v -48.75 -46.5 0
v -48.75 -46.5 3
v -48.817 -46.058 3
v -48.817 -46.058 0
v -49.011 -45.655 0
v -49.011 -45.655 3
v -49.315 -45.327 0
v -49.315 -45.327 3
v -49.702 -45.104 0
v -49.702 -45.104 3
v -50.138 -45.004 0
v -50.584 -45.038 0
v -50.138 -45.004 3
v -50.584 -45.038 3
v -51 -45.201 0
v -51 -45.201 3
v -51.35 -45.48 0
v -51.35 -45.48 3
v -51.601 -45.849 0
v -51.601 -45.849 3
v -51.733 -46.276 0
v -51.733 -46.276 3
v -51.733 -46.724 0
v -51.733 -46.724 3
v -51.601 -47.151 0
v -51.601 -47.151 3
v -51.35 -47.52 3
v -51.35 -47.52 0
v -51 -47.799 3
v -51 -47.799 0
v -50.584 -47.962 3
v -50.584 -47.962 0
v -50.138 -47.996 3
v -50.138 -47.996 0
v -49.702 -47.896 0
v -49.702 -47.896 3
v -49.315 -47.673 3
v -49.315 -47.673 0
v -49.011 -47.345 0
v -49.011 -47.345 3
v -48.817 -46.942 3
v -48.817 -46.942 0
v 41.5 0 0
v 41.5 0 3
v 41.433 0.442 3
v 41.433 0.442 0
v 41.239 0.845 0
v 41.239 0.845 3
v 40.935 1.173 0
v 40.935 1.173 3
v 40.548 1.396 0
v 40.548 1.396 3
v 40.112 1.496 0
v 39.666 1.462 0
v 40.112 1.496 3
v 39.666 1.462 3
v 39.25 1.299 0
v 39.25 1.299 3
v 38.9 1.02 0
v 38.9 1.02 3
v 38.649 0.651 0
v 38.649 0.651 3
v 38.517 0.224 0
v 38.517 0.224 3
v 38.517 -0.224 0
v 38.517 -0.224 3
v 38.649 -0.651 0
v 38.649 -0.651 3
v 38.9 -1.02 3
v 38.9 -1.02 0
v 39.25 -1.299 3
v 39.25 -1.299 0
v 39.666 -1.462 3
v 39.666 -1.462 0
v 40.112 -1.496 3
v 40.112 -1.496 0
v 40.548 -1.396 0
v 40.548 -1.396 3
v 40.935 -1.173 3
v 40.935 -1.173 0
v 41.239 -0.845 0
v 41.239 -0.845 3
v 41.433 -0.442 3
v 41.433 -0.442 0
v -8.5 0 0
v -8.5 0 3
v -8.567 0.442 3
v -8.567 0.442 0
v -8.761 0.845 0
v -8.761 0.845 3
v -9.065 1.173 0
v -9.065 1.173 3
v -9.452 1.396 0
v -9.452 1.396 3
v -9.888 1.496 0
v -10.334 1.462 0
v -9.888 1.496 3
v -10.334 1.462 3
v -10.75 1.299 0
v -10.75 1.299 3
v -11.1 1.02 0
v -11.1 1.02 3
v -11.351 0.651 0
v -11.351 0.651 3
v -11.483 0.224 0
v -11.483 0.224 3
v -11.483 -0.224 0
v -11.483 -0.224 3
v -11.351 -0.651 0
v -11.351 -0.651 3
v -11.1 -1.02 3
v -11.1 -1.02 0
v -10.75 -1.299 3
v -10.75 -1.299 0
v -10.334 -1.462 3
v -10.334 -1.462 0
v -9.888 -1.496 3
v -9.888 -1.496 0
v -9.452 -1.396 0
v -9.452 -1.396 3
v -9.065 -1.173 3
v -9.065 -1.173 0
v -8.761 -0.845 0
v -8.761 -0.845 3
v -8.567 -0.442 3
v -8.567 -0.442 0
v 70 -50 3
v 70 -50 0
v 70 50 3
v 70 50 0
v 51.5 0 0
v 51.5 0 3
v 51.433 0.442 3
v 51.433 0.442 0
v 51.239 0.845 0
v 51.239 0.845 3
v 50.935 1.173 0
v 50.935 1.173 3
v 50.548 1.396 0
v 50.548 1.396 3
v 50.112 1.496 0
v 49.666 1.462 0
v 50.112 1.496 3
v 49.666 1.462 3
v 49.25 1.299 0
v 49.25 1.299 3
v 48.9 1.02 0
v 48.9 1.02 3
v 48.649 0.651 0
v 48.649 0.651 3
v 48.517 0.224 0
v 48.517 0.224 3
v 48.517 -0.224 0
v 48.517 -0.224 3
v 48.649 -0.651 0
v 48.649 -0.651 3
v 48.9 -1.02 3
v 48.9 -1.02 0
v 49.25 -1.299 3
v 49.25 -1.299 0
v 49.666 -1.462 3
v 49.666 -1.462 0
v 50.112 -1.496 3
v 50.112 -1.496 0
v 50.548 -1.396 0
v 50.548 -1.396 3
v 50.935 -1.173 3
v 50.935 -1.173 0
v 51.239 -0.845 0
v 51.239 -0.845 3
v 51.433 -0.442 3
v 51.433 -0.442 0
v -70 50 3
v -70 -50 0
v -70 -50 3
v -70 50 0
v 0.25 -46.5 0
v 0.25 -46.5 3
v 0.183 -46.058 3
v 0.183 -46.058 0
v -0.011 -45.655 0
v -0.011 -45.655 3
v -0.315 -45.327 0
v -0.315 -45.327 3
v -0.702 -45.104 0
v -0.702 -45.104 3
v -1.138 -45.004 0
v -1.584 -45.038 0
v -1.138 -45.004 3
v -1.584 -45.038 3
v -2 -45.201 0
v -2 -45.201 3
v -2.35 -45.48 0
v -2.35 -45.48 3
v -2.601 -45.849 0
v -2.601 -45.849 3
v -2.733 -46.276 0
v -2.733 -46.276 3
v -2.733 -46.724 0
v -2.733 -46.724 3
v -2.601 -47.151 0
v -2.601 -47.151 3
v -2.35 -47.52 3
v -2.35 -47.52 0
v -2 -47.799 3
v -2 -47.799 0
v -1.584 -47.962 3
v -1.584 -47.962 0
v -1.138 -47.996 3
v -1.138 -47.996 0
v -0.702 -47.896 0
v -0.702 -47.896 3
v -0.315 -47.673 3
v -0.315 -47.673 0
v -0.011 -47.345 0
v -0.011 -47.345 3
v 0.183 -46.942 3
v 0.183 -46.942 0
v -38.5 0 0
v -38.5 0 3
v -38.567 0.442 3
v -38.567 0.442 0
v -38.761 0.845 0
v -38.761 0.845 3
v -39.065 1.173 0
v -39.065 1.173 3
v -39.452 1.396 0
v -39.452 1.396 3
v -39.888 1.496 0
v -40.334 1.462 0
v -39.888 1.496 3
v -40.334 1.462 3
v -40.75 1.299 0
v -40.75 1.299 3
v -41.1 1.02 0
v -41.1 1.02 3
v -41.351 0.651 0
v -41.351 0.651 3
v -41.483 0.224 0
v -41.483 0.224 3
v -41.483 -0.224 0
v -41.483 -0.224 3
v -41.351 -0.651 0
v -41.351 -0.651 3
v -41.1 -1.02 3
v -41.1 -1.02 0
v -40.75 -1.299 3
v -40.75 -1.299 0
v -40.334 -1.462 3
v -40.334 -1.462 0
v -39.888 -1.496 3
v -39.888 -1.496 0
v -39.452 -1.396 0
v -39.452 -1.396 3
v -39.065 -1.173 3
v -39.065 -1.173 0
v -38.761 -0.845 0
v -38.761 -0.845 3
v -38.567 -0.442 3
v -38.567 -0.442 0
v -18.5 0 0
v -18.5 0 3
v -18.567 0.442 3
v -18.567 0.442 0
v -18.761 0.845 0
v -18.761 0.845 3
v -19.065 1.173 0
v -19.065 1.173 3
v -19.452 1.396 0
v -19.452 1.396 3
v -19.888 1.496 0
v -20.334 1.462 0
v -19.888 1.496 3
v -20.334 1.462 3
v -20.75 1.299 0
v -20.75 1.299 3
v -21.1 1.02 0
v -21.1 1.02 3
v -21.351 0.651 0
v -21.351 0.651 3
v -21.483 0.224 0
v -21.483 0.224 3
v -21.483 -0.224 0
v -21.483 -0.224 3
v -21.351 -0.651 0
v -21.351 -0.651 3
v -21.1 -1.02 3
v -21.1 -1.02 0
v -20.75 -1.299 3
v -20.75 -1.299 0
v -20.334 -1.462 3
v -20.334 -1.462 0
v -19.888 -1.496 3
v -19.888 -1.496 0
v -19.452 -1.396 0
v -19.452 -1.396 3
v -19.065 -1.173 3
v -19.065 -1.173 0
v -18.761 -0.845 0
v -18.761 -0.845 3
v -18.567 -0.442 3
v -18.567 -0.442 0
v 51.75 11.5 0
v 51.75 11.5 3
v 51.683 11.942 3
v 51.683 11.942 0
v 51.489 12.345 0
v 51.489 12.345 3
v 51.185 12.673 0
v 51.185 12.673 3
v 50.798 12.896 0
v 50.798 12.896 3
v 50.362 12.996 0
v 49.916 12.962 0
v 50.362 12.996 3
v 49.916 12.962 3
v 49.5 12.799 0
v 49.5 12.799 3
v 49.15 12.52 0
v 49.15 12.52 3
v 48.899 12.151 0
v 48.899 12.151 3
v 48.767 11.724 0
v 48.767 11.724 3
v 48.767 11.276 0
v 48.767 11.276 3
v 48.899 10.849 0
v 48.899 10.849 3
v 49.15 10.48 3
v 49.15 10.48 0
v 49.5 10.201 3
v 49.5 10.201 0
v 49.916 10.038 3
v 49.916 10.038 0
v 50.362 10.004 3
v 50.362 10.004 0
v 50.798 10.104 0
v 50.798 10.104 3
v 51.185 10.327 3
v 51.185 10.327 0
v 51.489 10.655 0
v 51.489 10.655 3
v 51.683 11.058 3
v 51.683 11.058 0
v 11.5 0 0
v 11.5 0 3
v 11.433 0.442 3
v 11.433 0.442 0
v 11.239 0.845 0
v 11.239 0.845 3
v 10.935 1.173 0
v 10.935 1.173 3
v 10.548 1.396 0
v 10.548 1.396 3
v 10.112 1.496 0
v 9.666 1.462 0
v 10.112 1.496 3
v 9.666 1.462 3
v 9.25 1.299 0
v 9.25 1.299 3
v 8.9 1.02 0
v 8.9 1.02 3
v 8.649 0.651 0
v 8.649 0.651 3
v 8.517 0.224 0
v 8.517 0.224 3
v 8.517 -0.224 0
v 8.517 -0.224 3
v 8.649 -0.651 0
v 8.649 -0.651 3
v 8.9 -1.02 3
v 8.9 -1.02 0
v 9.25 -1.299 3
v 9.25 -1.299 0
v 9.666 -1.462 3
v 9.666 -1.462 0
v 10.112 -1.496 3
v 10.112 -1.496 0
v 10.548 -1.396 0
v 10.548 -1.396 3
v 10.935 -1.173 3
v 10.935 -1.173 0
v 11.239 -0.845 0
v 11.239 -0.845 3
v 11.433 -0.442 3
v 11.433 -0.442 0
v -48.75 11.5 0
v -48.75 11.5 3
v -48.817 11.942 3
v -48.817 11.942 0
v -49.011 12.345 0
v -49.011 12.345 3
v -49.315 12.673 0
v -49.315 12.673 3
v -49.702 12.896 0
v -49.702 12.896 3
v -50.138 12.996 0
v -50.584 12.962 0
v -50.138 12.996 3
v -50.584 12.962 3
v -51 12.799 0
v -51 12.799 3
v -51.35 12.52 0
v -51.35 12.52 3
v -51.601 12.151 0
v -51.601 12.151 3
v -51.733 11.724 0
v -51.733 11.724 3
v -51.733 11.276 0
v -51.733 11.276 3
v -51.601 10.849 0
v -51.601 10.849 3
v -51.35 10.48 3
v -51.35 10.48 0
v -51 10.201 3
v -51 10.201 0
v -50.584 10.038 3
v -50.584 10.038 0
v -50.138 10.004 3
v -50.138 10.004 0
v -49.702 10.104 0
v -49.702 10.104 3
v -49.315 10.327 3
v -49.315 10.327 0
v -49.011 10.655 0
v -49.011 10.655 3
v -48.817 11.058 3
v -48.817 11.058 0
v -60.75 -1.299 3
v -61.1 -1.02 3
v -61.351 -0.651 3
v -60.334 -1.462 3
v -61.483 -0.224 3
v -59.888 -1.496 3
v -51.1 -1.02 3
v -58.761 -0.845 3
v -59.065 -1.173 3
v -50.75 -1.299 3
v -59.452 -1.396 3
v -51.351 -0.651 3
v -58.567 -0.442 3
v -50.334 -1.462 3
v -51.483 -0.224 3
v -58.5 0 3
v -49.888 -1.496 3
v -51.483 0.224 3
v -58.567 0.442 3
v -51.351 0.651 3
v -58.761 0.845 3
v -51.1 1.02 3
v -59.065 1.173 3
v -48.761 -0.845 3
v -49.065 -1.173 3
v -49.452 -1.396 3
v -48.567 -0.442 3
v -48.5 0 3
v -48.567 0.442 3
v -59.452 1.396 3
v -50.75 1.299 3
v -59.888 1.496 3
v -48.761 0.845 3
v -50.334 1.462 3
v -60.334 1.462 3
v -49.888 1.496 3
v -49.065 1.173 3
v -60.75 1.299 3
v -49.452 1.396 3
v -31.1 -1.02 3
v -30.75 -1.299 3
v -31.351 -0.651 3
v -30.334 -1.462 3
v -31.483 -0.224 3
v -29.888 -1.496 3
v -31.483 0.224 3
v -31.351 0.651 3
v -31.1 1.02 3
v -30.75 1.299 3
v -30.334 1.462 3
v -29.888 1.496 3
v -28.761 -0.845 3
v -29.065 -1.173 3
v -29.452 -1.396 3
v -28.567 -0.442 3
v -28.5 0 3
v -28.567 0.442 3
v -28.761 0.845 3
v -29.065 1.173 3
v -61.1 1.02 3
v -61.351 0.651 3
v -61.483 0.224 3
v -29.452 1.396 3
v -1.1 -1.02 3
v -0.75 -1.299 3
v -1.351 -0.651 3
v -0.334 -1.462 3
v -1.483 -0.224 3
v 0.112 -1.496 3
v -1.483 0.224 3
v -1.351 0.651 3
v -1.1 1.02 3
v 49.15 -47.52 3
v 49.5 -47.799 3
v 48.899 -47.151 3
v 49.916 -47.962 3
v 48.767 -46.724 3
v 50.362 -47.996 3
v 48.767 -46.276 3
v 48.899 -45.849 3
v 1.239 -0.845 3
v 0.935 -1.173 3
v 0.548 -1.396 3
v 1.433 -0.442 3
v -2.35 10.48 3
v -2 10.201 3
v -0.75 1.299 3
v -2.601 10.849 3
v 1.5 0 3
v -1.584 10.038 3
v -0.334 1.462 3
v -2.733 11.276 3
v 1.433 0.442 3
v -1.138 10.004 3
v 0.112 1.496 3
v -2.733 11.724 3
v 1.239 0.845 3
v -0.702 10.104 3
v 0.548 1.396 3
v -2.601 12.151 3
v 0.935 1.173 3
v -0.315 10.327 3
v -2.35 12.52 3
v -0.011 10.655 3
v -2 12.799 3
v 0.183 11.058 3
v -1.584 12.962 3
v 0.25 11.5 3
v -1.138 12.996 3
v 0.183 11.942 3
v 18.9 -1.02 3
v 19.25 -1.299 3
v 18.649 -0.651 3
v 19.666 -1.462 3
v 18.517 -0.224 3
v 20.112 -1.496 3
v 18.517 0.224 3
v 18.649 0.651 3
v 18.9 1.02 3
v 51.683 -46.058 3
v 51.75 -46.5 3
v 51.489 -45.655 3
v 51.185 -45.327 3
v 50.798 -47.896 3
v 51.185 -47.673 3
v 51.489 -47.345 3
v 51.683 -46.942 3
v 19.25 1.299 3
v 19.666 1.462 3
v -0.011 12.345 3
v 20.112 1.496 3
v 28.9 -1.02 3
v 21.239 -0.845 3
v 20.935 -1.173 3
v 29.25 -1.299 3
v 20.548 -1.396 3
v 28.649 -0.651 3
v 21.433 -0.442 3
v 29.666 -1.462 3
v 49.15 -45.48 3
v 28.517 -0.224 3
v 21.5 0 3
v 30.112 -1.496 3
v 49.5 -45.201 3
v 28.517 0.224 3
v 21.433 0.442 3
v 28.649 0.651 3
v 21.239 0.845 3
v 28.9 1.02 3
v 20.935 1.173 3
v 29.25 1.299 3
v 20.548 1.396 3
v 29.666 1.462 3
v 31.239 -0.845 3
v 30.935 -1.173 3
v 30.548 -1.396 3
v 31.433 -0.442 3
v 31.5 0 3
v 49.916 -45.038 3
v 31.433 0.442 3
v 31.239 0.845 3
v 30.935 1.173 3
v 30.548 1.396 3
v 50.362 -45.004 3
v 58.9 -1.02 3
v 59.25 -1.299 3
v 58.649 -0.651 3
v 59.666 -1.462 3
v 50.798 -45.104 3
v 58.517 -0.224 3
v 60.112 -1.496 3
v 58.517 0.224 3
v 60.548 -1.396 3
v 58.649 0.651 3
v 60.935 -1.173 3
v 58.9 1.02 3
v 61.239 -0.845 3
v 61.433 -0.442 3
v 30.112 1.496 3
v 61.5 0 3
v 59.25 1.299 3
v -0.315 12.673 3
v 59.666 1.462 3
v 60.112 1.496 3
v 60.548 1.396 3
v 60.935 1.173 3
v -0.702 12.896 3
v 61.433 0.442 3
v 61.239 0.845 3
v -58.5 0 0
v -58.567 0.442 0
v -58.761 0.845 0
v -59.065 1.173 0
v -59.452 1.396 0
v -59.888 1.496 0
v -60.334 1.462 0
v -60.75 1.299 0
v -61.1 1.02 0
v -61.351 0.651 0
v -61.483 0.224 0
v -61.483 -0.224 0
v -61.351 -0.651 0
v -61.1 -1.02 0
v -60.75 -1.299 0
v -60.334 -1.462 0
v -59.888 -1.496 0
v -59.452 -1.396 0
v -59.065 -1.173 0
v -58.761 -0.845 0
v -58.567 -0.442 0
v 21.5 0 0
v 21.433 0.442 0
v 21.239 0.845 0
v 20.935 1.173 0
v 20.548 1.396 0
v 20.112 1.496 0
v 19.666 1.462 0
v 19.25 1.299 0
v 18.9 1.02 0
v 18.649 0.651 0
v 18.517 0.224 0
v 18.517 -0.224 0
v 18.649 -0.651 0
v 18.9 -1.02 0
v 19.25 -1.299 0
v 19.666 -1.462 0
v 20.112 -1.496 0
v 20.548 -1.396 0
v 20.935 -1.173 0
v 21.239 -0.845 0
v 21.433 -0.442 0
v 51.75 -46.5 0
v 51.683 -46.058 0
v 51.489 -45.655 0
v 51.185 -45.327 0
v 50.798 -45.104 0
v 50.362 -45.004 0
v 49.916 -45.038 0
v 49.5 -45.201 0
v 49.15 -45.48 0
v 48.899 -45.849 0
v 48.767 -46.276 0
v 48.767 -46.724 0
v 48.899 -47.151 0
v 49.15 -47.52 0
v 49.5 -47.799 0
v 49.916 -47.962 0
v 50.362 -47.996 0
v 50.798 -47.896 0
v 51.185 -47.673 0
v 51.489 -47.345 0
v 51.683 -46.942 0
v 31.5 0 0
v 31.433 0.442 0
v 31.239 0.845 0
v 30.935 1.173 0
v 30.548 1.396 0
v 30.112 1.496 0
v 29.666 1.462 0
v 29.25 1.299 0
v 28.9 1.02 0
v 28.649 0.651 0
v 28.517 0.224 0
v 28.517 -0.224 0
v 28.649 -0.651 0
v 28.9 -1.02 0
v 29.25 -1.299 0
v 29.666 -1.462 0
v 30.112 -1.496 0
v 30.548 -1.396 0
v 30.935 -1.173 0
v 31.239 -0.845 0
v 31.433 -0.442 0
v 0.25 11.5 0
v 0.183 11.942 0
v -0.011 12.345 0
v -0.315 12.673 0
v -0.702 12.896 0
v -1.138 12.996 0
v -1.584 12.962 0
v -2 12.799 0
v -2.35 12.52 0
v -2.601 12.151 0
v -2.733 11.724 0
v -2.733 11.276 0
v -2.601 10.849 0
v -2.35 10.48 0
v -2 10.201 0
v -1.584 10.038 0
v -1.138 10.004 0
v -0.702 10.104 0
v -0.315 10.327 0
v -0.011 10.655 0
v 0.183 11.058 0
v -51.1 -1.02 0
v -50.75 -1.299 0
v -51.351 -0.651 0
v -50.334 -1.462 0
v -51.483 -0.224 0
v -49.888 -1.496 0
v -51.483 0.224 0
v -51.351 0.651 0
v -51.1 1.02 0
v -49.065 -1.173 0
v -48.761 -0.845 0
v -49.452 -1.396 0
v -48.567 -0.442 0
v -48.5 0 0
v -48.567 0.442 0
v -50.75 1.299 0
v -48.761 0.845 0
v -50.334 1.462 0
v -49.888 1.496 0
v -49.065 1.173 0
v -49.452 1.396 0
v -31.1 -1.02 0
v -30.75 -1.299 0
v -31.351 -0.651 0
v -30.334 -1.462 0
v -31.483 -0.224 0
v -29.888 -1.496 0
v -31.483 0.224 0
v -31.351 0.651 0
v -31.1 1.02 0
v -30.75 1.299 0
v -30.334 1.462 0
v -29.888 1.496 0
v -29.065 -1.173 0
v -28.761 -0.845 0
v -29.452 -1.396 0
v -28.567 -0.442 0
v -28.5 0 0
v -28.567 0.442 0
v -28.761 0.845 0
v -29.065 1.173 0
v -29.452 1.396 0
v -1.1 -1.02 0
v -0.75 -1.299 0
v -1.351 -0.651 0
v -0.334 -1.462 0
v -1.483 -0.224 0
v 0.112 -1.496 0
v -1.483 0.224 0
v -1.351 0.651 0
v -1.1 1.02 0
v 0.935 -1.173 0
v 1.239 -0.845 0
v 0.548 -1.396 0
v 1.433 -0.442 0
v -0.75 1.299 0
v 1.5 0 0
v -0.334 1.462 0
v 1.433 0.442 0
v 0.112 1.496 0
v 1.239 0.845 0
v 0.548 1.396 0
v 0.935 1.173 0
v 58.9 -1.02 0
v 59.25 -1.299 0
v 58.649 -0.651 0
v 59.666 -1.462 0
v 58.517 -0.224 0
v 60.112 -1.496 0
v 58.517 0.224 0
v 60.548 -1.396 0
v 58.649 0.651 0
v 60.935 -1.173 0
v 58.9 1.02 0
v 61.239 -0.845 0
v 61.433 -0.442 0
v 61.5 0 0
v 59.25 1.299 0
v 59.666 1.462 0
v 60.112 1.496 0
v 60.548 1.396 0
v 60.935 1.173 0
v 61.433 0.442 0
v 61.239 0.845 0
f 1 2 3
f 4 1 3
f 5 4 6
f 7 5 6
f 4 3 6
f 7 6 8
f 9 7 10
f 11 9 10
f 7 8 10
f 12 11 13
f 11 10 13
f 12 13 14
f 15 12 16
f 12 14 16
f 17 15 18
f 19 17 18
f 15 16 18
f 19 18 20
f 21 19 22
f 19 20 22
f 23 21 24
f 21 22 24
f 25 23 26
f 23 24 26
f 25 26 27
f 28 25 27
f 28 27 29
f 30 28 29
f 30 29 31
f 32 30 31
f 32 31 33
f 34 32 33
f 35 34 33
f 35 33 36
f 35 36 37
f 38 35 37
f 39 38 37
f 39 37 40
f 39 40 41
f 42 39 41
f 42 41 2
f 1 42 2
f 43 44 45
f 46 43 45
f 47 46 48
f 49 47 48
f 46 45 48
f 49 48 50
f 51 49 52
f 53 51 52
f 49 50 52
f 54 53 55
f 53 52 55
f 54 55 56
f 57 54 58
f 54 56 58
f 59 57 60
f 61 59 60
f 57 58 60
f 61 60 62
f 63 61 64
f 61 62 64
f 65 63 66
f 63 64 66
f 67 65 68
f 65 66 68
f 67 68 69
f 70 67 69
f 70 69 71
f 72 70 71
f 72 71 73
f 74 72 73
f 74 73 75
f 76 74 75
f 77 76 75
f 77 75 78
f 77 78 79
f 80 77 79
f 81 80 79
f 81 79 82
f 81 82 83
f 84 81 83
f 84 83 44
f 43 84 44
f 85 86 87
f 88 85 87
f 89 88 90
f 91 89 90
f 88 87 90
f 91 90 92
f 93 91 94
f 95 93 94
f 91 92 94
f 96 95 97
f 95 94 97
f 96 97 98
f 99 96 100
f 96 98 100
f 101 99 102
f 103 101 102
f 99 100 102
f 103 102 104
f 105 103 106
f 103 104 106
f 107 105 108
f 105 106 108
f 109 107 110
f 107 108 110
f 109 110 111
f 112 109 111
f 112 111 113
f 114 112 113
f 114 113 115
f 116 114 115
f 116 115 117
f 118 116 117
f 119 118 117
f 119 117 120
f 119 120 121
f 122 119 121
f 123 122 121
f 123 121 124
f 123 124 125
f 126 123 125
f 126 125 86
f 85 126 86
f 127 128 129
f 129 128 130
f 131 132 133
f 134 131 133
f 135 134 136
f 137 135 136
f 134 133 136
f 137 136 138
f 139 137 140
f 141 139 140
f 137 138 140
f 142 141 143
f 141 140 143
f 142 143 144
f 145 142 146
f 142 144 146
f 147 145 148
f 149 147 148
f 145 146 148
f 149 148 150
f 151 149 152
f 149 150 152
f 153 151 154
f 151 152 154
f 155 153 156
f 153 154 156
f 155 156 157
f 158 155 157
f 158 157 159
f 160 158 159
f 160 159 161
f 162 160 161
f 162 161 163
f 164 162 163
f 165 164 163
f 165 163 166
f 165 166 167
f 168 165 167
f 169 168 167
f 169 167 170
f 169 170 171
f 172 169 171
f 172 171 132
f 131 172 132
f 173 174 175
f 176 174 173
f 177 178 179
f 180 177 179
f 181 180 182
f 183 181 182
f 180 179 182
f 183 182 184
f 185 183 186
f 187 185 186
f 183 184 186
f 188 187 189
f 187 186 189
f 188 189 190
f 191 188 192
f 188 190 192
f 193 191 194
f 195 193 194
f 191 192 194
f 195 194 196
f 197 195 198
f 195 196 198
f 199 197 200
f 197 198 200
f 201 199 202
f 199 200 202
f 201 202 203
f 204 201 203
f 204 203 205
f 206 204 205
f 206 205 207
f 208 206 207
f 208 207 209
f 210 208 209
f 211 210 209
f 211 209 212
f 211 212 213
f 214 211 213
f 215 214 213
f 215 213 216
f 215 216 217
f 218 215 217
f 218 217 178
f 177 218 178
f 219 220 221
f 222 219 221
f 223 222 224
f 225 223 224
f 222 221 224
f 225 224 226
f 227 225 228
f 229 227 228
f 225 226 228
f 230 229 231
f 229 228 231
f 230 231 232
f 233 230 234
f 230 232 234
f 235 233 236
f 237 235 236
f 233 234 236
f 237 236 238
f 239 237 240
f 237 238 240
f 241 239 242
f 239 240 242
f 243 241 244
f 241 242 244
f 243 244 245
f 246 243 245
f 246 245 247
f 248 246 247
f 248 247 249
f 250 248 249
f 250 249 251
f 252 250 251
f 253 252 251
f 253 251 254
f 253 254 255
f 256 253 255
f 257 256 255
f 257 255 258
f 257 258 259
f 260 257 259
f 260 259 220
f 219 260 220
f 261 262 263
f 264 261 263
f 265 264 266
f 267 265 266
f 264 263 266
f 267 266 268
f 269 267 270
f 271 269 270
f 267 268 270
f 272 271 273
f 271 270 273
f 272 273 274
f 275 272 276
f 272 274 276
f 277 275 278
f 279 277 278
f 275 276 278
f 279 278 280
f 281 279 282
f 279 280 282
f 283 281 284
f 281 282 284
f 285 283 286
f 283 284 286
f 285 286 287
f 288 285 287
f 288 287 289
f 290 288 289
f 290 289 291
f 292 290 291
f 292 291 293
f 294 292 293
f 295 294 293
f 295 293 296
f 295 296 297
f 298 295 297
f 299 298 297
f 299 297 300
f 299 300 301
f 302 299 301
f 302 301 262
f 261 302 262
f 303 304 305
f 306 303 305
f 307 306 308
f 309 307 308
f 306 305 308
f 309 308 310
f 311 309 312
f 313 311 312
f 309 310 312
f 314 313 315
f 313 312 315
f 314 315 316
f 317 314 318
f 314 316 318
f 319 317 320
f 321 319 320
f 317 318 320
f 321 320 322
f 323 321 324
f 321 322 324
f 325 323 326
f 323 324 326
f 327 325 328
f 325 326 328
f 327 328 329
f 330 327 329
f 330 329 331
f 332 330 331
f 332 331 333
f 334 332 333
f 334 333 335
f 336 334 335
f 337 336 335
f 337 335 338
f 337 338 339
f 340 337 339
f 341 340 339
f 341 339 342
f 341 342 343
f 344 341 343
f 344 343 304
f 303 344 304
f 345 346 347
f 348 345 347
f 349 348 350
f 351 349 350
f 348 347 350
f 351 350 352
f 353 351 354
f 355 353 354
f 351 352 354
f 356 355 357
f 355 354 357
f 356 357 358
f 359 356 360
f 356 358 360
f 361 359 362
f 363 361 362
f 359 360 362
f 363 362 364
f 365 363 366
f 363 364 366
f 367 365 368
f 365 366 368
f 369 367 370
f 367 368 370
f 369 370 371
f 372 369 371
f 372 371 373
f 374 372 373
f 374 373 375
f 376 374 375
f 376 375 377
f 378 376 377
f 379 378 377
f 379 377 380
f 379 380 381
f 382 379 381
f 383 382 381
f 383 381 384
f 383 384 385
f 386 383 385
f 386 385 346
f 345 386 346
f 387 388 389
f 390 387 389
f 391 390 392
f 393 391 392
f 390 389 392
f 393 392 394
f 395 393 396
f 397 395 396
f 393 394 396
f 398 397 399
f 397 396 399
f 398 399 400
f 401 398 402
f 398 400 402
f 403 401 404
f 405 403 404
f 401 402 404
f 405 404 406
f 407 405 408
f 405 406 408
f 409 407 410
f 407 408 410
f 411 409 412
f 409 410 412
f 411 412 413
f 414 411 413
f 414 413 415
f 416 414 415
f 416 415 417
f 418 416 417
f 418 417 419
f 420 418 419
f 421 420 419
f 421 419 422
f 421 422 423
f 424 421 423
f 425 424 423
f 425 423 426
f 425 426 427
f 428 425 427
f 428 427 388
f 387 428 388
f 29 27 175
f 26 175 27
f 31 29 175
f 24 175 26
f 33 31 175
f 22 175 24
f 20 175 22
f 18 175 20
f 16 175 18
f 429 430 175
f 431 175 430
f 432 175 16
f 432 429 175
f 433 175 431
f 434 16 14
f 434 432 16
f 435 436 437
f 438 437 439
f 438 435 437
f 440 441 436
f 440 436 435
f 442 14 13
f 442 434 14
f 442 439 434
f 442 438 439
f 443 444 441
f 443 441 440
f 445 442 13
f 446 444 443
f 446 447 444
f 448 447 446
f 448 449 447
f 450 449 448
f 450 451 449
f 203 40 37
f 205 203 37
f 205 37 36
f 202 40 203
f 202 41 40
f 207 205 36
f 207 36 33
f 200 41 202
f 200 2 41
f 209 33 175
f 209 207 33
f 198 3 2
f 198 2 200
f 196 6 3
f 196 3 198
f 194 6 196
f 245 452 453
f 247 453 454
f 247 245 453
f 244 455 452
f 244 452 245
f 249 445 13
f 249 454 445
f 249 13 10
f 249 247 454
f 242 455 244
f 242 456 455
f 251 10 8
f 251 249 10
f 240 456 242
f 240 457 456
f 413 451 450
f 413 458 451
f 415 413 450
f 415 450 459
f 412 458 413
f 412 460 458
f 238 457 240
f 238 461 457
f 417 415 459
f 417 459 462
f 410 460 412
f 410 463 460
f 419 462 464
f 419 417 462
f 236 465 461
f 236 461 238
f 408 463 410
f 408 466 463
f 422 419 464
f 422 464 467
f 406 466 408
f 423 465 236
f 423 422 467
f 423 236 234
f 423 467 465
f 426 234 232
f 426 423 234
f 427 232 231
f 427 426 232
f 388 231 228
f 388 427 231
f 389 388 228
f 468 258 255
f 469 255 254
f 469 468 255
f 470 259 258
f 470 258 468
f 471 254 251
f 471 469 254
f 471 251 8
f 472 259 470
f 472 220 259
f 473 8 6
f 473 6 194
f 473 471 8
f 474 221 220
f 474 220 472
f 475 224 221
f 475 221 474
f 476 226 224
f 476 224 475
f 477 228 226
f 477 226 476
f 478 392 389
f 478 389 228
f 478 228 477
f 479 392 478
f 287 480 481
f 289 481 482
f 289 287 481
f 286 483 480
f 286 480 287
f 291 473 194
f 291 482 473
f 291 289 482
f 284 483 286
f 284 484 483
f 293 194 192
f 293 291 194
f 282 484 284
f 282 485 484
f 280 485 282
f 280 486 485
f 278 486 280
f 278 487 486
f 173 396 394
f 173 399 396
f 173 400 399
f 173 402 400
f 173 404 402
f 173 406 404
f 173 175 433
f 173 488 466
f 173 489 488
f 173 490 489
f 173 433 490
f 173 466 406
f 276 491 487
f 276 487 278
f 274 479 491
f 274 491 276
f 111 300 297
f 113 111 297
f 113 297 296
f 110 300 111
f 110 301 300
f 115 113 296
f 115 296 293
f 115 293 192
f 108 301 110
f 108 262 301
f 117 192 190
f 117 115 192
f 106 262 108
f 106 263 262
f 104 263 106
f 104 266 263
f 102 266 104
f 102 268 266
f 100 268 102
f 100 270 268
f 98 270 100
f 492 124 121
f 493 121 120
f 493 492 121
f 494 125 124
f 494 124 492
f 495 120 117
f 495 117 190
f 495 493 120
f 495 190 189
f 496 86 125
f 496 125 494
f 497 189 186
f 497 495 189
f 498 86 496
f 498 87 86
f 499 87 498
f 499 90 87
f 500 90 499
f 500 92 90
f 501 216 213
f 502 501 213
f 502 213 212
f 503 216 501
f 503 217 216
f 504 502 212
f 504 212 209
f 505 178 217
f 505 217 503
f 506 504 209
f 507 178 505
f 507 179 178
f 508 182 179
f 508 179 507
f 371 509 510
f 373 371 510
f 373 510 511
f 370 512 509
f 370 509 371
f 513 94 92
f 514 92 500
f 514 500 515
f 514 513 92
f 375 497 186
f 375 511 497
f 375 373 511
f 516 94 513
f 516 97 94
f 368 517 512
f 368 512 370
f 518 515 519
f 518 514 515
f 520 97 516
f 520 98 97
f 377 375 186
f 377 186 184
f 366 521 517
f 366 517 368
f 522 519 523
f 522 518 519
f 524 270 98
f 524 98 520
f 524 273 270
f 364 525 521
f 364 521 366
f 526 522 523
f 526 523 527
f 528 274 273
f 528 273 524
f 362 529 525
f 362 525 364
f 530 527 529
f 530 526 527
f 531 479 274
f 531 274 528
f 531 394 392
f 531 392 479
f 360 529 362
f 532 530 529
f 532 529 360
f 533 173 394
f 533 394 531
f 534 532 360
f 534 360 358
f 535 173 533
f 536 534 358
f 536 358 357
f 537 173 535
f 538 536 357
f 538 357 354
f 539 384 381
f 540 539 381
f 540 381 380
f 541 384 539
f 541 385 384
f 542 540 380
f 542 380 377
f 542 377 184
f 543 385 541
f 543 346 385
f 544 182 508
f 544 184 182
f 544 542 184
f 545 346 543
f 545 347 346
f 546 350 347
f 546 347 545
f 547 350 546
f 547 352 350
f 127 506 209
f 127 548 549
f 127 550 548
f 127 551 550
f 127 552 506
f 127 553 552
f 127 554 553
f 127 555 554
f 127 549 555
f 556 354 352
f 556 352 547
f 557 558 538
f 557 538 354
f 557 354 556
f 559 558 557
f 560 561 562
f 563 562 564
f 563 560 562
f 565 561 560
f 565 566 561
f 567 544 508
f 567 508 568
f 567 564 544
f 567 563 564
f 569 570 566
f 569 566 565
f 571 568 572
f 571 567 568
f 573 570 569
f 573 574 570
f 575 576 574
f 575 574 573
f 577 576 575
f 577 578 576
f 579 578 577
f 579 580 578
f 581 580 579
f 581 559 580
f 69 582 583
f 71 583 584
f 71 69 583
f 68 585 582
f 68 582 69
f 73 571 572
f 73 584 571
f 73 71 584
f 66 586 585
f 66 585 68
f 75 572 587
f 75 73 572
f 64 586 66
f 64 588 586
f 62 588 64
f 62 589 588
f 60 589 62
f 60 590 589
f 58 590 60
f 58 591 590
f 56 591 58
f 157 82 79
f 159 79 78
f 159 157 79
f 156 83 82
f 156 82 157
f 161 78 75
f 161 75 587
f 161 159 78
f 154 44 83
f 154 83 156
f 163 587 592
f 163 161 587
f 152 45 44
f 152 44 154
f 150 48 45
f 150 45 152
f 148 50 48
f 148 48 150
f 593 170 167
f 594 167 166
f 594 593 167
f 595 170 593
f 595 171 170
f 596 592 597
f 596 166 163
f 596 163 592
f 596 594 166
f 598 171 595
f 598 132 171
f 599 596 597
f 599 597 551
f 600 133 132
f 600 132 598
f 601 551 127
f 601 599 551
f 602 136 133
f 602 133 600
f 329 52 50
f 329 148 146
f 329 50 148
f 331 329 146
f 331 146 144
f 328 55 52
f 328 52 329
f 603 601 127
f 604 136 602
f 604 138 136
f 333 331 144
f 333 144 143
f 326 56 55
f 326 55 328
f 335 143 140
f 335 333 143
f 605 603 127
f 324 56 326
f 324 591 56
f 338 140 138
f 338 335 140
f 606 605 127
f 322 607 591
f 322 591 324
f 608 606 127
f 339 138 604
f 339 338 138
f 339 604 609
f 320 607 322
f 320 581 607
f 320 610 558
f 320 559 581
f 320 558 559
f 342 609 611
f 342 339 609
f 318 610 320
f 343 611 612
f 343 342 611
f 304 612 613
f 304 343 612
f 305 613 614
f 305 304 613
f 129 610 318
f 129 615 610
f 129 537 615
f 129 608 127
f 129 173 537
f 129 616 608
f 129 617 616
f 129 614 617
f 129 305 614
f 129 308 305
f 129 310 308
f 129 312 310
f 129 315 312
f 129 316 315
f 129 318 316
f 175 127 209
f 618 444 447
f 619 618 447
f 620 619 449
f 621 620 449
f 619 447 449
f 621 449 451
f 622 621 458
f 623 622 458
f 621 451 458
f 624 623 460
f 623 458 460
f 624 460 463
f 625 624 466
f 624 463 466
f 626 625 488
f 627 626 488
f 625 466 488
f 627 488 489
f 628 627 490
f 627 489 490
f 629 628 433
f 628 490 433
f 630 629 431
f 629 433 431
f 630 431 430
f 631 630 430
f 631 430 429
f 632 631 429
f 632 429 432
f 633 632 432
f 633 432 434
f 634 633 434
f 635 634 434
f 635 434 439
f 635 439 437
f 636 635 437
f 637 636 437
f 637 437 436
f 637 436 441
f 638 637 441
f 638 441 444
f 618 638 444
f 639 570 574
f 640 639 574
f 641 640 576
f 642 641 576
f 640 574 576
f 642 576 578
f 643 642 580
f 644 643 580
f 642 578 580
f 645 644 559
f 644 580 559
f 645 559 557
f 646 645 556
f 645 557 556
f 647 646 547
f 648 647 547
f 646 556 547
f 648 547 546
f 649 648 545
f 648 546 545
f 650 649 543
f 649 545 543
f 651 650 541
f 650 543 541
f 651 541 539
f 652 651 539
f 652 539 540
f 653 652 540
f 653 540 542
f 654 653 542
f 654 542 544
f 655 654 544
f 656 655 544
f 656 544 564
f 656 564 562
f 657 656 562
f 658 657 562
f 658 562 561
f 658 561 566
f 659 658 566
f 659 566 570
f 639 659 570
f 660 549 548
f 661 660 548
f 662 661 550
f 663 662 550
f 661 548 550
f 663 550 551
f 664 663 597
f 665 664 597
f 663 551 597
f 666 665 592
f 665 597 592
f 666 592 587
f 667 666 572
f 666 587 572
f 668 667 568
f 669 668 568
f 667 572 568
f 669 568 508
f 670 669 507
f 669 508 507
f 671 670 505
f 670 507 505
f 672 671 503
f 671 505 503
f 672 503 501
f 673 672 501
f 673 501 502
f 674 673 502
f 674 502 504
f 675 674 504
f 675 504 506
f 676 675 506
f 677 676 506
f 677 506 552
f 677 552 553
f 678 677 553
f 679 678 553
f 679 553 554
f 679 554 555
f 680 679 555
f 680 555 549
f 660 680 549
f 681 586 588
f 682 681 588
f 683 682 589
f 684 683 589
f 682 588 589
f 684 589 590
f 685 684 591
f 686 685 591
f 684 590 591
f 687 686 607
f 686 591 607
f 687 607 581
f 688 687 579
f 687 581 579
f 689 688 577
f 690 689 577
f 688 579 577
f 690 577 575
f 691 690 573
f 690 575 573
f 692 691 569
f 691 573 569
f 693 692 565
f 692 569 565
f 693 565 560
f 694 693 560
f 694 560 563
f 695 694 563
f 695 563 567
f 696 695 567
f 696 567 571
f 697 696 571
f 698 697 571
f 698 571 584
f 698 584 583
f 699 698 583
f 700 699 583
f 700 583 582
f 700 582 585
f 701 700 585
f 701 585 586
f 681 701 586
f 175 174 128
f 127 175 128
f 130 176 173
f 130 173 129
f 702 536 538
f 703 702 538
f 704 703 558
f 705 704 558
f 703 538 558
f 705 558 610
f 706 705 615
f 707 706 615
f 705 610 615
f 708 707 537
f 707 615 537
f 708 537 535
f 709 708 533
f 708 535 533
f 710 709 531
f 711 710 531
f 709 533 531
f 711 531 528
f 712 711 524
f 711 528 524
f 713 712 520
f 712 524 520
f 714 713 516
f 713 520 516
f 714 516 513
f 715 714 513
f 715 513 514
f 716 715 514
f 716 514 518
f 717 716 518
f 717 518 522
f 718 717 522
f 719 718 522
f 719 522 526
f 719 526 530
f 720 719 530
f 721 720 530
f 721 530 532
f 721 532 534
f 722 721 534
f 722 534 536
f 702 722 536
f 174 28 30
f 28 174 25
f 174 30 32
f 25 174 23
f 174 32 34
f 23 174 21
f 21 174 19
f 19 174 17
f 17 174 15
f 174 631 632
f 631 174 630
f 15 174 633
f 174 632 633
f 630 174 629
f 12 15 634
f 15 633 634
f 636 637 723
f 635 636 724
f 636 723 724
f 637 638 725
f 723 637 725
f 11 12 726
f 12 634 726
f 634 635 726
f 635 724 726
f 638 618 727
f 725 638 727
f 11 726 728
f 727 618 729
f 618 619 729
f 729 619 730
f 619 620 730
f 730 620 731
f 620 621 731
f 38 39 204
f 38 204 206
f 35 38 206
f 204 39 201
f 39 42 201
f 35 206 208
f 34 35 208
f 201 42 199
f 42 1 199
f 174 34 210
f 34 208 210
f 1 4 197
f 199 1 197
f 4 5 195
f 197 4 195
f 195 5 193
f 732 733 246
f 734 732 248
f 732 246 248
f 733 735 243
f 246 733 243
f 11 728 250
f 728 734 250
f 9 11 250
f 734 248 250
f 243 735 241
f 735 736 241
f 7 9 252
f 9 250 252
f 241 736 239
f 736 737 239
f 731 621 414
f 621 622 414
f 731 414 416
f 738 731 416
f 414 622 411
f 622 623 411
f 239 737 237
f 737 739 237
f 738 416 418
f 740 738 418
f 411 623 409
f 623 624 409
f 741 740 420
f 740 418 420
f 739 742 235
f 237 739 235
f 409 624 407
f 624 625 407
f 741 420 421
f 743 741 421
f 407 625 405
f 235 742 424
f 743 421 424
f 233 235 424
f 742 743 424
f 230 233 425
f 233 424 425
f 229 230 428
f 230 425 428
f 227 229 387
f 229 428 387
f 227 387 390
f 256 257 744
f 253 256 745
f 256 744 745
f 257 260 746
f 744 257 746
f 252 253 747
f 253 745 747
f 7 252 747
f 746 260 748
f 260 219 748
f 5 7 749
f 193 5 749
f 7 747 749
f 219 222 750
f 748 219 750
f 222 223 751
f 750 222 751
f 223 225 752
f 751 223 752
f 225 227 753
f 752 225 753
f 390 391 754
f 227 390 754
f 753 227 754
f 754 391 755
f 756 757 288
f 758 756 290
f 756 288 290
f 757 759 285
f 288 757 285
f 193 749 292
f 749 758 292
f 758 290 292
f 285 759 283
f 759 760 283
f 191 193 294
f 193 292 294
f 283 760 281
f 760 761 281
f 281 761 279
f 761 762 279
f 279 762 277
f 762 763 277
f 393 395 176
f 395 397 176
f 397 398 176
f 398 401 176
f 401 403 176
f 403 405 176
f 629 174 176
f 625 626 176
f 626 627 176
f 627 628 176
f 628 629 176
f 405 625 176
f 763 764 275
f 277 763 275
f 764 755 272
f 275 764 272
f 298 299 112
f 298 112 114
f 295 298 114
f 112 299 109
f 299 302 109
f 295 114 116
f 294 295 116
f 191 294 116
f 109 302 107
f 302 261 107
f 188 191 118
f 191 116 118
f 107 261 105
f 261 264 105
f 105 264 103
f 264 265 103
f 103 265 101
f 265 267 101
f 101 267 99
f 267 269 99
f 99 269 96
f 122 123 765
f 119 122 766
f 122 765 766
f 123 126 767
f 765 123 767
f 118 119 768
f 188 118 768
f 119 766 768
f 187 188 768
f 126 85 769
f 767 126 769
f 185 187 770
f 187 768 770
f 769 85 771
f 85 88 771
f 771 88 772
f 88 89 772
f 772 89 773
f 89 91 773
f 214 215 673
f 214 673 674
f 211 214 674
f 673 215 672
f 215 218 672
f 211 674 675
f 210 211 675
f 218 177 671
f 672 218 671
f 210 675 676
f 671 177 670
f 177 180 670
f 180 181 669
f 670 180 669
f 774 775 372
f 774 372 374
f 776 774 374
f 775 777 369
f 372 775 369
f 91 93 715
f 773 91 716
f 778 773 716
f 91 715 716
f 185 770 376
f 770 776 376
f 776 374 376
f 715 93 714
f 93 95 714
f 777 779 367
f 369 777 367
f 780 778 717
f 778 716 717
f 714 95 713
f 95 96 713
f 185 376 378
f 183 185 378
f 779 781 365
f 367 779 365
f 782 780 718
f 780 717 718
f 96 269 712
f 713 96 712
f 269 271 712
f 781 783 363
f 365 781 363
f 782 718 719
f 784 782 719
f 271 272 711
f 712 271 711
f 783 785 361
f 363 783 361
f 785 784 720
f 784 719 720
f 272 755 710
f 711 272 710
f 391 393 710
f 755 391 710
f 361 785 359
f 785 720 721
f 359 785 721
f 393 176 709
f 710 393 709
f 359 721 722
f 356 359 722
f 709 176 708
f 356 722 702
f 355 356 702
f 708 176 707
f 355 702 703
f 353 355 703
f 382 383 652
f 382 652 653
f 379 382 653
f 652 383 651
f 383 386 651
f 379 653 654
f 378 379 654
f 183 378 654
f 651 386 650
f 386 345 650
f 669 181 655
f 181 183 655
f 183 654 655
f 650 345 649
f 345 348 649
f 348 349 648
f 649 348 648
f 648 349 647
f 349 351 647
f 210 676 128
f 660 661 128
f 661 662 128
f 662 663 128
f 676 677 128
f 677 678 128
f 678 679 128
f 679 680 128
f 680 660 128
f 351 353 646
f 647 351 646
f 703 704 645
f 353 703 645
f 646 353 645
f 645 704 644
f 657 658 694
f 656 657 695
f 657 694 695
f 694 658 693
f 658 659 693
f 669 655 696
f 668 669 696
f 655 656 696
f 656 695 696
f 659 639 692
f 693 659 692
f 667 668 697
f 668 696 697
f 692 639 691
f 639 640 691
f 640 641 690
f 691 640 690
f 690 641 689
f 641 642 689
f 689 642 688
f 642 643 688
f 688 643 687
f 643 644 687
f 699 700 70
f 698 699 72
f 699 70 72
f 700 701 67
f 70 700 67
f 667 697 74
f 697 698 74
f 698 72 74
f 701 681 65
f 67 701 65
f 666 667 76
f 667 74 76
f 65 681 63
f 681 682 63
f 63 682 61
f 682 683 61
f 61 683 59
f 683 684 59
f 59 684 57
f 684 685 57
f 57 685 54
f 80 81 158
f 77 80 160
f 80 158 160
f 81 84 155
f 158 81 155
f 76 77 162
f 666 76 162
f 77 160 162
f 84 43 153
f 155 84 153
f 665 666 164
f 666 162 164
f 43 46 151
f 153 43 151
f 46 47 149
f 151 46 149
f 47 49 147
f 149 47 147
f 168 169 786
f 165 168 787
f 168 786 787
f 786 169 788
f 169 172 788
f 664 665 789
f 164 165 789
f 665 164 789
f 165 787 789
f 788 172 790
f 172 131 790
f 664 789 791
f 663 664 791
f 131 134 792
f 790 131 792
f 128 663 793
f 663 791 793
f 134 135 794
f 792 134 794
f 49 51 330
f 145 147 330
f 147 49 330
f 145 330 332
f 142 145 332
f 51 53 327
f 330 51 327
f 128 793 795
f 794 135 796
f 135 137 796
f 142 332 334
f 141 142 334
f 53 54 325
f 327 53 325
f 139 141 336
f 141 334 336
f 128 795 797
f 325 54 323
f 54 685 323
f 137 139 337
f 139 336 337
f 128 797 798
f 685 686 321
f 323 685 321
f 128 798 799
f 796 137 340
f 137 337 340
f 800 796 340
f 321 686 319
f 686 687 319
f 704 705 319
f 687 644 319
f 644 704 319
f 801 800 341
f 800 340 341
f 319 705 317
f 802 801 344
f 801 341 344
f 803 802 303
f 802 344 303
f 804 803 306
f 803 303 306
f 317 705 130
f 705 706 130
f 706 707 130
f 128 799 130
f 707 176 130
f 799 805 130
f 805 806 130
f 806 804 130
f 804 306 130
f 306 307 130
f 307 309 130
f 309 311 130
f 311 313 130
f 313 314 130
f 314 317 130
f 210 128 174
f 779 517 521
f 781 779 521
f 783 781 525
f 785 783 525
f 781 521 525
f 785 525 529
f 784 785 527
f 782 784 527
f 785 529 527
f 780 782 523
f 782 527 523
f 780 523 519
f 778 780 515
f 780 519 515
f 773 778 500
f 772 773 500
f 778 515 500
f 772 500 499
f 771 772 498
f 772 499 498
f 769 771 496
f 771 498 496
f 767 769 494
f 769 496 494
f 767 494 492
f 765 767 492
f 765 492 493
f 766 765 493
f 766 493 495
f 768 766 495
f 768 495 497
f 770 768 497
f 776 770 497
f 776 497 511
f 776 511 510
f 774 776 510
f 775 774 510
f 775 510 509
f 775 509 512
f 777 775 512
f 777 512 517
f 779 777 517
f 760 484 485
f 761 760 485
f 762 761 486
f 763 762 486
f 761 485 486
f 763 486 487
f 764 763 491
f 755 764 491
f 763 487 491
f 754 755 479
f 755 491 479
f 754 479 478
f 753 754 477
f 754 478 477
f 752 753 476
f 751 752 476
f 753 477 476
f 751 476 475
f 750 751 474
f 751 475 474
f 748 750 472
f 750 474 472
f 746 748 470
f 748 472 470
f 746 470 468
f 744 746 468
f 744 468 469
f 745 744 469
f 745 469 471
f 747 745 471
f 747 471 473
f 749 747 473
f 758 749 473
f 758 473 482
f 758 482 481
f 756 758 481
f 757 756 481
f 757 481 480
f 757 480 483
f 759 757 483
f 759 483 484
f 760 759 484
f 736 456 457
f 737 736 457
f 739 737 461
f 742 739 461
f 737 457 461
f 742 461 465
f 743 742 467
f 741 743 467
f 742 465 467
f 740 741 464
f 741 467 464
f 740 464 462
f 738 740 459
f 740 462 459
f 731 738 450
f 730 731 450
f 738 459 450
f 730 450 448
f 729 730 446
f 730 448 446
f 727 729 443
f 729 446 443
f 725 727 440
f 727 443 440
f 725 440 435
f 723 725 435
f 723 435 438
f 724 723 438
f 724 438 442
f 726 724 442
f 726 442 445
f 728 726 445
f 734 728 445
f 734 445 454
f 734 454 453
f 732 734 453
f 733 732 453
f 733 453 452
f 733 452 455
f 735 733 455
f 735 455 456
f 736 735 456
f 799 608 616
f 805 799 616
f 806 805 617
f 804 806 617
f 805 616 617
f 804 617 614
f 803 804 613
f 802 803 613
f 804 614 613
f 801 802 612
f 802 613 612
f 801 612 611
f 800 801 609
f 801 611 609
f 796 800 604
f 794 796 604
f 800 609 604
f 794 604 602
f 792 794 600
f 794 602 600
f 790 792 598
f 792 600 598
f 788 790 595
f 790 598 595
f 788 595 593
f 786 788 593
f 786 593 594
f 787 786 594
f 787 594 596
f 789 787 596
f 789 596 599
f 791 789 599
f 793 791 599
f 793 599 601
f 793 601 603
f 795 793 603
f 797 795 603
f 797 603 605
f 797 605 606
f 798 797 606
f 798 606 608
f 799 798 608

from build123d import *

# Parameters (mm, degrees)
SKETCH1_W           = 140
SKETCH1_H           = 100
BOSS_EXTRUDE1_DEPTH = 3
SKETCH2_R           = 1.5
CUT_EXTRUDE1_DEPTH  = 4
SKETCH3_R           = 1.5
CUT_EXTRUDE2_DEPTH  = 10


with BuildPart() as part:
    # Sketch1 → Boss-Extrude1 (new body)
    with BuildSketch(Plane.XY):
        Rectangle(SKETCH1_W, SKETCH1_H)
    extrude(amount=BOSS_EXTRUDE1_DEPTH)

    # Sketch2 → Cut-Extrude1 (cut)
    with BuildSketch(Plane.XY.offset(3)):
        Circle(SKETCH2_R)
        with Locations((10, 0)):
            Circle(SKETCH2_R)
        with Locations((20, 0)):
            Circle(SKETCH2_R)
        with Locations((30, 0)):
            Circle(SKETCH2_R)
        with Locations((40, 0)):
            Circle(SKETCH2_R)
        with Locations((50, 0)):
            Circle(SKETCH2_R)
        with Locations((60, 0)):
            Circle(SKETCH2_R)
        with Locations((-10, 0)):
            Circle(SKETCH2_R)
        with Locations((-20, 0)):
            Circle(SKETCH2_R)
        with Locations((-30, 0)):
            Circle(SKETCH2_R)
        with Locations((-40, 0)):
            Circle(SKETCH2_R)
        with Locations((-50, 0)):
            Circle(SKETCH2_R)
        with Locations((-60, 0)):
            Circle(SKETCH2_R)
    extrude(amount=-CUT_EXTRUDE1_DEPTH, mode=Mode.SUBTRACT)

    # Sketch3 → Cut-Extrude2 (cut)
    with BuildSketch(Plane.XY.offset(3)):
        with Locations((50.25, -46.5)):
            Circle(SKETCH3_R)
        with Locations((-50.25, -46.5)):
            Circle(SKETCH3_R)
        with Locations((-1.25, -46.5)):
            Circle(SKETCH3_R)
        with Locations((-1.25, 11.5)):
            Circle(SKETCH3_R)
        with Locations((50.25, 11.5)):
            Circle(SKETCH3_R)
        with Locations((-50.25, 11.5)):
            Circle(SKETCH3_R)
    extrude(amount=-CUT_EXTRUDE2_DEPTH, mode=Mode.SUBTRACT)


solid = part.part
